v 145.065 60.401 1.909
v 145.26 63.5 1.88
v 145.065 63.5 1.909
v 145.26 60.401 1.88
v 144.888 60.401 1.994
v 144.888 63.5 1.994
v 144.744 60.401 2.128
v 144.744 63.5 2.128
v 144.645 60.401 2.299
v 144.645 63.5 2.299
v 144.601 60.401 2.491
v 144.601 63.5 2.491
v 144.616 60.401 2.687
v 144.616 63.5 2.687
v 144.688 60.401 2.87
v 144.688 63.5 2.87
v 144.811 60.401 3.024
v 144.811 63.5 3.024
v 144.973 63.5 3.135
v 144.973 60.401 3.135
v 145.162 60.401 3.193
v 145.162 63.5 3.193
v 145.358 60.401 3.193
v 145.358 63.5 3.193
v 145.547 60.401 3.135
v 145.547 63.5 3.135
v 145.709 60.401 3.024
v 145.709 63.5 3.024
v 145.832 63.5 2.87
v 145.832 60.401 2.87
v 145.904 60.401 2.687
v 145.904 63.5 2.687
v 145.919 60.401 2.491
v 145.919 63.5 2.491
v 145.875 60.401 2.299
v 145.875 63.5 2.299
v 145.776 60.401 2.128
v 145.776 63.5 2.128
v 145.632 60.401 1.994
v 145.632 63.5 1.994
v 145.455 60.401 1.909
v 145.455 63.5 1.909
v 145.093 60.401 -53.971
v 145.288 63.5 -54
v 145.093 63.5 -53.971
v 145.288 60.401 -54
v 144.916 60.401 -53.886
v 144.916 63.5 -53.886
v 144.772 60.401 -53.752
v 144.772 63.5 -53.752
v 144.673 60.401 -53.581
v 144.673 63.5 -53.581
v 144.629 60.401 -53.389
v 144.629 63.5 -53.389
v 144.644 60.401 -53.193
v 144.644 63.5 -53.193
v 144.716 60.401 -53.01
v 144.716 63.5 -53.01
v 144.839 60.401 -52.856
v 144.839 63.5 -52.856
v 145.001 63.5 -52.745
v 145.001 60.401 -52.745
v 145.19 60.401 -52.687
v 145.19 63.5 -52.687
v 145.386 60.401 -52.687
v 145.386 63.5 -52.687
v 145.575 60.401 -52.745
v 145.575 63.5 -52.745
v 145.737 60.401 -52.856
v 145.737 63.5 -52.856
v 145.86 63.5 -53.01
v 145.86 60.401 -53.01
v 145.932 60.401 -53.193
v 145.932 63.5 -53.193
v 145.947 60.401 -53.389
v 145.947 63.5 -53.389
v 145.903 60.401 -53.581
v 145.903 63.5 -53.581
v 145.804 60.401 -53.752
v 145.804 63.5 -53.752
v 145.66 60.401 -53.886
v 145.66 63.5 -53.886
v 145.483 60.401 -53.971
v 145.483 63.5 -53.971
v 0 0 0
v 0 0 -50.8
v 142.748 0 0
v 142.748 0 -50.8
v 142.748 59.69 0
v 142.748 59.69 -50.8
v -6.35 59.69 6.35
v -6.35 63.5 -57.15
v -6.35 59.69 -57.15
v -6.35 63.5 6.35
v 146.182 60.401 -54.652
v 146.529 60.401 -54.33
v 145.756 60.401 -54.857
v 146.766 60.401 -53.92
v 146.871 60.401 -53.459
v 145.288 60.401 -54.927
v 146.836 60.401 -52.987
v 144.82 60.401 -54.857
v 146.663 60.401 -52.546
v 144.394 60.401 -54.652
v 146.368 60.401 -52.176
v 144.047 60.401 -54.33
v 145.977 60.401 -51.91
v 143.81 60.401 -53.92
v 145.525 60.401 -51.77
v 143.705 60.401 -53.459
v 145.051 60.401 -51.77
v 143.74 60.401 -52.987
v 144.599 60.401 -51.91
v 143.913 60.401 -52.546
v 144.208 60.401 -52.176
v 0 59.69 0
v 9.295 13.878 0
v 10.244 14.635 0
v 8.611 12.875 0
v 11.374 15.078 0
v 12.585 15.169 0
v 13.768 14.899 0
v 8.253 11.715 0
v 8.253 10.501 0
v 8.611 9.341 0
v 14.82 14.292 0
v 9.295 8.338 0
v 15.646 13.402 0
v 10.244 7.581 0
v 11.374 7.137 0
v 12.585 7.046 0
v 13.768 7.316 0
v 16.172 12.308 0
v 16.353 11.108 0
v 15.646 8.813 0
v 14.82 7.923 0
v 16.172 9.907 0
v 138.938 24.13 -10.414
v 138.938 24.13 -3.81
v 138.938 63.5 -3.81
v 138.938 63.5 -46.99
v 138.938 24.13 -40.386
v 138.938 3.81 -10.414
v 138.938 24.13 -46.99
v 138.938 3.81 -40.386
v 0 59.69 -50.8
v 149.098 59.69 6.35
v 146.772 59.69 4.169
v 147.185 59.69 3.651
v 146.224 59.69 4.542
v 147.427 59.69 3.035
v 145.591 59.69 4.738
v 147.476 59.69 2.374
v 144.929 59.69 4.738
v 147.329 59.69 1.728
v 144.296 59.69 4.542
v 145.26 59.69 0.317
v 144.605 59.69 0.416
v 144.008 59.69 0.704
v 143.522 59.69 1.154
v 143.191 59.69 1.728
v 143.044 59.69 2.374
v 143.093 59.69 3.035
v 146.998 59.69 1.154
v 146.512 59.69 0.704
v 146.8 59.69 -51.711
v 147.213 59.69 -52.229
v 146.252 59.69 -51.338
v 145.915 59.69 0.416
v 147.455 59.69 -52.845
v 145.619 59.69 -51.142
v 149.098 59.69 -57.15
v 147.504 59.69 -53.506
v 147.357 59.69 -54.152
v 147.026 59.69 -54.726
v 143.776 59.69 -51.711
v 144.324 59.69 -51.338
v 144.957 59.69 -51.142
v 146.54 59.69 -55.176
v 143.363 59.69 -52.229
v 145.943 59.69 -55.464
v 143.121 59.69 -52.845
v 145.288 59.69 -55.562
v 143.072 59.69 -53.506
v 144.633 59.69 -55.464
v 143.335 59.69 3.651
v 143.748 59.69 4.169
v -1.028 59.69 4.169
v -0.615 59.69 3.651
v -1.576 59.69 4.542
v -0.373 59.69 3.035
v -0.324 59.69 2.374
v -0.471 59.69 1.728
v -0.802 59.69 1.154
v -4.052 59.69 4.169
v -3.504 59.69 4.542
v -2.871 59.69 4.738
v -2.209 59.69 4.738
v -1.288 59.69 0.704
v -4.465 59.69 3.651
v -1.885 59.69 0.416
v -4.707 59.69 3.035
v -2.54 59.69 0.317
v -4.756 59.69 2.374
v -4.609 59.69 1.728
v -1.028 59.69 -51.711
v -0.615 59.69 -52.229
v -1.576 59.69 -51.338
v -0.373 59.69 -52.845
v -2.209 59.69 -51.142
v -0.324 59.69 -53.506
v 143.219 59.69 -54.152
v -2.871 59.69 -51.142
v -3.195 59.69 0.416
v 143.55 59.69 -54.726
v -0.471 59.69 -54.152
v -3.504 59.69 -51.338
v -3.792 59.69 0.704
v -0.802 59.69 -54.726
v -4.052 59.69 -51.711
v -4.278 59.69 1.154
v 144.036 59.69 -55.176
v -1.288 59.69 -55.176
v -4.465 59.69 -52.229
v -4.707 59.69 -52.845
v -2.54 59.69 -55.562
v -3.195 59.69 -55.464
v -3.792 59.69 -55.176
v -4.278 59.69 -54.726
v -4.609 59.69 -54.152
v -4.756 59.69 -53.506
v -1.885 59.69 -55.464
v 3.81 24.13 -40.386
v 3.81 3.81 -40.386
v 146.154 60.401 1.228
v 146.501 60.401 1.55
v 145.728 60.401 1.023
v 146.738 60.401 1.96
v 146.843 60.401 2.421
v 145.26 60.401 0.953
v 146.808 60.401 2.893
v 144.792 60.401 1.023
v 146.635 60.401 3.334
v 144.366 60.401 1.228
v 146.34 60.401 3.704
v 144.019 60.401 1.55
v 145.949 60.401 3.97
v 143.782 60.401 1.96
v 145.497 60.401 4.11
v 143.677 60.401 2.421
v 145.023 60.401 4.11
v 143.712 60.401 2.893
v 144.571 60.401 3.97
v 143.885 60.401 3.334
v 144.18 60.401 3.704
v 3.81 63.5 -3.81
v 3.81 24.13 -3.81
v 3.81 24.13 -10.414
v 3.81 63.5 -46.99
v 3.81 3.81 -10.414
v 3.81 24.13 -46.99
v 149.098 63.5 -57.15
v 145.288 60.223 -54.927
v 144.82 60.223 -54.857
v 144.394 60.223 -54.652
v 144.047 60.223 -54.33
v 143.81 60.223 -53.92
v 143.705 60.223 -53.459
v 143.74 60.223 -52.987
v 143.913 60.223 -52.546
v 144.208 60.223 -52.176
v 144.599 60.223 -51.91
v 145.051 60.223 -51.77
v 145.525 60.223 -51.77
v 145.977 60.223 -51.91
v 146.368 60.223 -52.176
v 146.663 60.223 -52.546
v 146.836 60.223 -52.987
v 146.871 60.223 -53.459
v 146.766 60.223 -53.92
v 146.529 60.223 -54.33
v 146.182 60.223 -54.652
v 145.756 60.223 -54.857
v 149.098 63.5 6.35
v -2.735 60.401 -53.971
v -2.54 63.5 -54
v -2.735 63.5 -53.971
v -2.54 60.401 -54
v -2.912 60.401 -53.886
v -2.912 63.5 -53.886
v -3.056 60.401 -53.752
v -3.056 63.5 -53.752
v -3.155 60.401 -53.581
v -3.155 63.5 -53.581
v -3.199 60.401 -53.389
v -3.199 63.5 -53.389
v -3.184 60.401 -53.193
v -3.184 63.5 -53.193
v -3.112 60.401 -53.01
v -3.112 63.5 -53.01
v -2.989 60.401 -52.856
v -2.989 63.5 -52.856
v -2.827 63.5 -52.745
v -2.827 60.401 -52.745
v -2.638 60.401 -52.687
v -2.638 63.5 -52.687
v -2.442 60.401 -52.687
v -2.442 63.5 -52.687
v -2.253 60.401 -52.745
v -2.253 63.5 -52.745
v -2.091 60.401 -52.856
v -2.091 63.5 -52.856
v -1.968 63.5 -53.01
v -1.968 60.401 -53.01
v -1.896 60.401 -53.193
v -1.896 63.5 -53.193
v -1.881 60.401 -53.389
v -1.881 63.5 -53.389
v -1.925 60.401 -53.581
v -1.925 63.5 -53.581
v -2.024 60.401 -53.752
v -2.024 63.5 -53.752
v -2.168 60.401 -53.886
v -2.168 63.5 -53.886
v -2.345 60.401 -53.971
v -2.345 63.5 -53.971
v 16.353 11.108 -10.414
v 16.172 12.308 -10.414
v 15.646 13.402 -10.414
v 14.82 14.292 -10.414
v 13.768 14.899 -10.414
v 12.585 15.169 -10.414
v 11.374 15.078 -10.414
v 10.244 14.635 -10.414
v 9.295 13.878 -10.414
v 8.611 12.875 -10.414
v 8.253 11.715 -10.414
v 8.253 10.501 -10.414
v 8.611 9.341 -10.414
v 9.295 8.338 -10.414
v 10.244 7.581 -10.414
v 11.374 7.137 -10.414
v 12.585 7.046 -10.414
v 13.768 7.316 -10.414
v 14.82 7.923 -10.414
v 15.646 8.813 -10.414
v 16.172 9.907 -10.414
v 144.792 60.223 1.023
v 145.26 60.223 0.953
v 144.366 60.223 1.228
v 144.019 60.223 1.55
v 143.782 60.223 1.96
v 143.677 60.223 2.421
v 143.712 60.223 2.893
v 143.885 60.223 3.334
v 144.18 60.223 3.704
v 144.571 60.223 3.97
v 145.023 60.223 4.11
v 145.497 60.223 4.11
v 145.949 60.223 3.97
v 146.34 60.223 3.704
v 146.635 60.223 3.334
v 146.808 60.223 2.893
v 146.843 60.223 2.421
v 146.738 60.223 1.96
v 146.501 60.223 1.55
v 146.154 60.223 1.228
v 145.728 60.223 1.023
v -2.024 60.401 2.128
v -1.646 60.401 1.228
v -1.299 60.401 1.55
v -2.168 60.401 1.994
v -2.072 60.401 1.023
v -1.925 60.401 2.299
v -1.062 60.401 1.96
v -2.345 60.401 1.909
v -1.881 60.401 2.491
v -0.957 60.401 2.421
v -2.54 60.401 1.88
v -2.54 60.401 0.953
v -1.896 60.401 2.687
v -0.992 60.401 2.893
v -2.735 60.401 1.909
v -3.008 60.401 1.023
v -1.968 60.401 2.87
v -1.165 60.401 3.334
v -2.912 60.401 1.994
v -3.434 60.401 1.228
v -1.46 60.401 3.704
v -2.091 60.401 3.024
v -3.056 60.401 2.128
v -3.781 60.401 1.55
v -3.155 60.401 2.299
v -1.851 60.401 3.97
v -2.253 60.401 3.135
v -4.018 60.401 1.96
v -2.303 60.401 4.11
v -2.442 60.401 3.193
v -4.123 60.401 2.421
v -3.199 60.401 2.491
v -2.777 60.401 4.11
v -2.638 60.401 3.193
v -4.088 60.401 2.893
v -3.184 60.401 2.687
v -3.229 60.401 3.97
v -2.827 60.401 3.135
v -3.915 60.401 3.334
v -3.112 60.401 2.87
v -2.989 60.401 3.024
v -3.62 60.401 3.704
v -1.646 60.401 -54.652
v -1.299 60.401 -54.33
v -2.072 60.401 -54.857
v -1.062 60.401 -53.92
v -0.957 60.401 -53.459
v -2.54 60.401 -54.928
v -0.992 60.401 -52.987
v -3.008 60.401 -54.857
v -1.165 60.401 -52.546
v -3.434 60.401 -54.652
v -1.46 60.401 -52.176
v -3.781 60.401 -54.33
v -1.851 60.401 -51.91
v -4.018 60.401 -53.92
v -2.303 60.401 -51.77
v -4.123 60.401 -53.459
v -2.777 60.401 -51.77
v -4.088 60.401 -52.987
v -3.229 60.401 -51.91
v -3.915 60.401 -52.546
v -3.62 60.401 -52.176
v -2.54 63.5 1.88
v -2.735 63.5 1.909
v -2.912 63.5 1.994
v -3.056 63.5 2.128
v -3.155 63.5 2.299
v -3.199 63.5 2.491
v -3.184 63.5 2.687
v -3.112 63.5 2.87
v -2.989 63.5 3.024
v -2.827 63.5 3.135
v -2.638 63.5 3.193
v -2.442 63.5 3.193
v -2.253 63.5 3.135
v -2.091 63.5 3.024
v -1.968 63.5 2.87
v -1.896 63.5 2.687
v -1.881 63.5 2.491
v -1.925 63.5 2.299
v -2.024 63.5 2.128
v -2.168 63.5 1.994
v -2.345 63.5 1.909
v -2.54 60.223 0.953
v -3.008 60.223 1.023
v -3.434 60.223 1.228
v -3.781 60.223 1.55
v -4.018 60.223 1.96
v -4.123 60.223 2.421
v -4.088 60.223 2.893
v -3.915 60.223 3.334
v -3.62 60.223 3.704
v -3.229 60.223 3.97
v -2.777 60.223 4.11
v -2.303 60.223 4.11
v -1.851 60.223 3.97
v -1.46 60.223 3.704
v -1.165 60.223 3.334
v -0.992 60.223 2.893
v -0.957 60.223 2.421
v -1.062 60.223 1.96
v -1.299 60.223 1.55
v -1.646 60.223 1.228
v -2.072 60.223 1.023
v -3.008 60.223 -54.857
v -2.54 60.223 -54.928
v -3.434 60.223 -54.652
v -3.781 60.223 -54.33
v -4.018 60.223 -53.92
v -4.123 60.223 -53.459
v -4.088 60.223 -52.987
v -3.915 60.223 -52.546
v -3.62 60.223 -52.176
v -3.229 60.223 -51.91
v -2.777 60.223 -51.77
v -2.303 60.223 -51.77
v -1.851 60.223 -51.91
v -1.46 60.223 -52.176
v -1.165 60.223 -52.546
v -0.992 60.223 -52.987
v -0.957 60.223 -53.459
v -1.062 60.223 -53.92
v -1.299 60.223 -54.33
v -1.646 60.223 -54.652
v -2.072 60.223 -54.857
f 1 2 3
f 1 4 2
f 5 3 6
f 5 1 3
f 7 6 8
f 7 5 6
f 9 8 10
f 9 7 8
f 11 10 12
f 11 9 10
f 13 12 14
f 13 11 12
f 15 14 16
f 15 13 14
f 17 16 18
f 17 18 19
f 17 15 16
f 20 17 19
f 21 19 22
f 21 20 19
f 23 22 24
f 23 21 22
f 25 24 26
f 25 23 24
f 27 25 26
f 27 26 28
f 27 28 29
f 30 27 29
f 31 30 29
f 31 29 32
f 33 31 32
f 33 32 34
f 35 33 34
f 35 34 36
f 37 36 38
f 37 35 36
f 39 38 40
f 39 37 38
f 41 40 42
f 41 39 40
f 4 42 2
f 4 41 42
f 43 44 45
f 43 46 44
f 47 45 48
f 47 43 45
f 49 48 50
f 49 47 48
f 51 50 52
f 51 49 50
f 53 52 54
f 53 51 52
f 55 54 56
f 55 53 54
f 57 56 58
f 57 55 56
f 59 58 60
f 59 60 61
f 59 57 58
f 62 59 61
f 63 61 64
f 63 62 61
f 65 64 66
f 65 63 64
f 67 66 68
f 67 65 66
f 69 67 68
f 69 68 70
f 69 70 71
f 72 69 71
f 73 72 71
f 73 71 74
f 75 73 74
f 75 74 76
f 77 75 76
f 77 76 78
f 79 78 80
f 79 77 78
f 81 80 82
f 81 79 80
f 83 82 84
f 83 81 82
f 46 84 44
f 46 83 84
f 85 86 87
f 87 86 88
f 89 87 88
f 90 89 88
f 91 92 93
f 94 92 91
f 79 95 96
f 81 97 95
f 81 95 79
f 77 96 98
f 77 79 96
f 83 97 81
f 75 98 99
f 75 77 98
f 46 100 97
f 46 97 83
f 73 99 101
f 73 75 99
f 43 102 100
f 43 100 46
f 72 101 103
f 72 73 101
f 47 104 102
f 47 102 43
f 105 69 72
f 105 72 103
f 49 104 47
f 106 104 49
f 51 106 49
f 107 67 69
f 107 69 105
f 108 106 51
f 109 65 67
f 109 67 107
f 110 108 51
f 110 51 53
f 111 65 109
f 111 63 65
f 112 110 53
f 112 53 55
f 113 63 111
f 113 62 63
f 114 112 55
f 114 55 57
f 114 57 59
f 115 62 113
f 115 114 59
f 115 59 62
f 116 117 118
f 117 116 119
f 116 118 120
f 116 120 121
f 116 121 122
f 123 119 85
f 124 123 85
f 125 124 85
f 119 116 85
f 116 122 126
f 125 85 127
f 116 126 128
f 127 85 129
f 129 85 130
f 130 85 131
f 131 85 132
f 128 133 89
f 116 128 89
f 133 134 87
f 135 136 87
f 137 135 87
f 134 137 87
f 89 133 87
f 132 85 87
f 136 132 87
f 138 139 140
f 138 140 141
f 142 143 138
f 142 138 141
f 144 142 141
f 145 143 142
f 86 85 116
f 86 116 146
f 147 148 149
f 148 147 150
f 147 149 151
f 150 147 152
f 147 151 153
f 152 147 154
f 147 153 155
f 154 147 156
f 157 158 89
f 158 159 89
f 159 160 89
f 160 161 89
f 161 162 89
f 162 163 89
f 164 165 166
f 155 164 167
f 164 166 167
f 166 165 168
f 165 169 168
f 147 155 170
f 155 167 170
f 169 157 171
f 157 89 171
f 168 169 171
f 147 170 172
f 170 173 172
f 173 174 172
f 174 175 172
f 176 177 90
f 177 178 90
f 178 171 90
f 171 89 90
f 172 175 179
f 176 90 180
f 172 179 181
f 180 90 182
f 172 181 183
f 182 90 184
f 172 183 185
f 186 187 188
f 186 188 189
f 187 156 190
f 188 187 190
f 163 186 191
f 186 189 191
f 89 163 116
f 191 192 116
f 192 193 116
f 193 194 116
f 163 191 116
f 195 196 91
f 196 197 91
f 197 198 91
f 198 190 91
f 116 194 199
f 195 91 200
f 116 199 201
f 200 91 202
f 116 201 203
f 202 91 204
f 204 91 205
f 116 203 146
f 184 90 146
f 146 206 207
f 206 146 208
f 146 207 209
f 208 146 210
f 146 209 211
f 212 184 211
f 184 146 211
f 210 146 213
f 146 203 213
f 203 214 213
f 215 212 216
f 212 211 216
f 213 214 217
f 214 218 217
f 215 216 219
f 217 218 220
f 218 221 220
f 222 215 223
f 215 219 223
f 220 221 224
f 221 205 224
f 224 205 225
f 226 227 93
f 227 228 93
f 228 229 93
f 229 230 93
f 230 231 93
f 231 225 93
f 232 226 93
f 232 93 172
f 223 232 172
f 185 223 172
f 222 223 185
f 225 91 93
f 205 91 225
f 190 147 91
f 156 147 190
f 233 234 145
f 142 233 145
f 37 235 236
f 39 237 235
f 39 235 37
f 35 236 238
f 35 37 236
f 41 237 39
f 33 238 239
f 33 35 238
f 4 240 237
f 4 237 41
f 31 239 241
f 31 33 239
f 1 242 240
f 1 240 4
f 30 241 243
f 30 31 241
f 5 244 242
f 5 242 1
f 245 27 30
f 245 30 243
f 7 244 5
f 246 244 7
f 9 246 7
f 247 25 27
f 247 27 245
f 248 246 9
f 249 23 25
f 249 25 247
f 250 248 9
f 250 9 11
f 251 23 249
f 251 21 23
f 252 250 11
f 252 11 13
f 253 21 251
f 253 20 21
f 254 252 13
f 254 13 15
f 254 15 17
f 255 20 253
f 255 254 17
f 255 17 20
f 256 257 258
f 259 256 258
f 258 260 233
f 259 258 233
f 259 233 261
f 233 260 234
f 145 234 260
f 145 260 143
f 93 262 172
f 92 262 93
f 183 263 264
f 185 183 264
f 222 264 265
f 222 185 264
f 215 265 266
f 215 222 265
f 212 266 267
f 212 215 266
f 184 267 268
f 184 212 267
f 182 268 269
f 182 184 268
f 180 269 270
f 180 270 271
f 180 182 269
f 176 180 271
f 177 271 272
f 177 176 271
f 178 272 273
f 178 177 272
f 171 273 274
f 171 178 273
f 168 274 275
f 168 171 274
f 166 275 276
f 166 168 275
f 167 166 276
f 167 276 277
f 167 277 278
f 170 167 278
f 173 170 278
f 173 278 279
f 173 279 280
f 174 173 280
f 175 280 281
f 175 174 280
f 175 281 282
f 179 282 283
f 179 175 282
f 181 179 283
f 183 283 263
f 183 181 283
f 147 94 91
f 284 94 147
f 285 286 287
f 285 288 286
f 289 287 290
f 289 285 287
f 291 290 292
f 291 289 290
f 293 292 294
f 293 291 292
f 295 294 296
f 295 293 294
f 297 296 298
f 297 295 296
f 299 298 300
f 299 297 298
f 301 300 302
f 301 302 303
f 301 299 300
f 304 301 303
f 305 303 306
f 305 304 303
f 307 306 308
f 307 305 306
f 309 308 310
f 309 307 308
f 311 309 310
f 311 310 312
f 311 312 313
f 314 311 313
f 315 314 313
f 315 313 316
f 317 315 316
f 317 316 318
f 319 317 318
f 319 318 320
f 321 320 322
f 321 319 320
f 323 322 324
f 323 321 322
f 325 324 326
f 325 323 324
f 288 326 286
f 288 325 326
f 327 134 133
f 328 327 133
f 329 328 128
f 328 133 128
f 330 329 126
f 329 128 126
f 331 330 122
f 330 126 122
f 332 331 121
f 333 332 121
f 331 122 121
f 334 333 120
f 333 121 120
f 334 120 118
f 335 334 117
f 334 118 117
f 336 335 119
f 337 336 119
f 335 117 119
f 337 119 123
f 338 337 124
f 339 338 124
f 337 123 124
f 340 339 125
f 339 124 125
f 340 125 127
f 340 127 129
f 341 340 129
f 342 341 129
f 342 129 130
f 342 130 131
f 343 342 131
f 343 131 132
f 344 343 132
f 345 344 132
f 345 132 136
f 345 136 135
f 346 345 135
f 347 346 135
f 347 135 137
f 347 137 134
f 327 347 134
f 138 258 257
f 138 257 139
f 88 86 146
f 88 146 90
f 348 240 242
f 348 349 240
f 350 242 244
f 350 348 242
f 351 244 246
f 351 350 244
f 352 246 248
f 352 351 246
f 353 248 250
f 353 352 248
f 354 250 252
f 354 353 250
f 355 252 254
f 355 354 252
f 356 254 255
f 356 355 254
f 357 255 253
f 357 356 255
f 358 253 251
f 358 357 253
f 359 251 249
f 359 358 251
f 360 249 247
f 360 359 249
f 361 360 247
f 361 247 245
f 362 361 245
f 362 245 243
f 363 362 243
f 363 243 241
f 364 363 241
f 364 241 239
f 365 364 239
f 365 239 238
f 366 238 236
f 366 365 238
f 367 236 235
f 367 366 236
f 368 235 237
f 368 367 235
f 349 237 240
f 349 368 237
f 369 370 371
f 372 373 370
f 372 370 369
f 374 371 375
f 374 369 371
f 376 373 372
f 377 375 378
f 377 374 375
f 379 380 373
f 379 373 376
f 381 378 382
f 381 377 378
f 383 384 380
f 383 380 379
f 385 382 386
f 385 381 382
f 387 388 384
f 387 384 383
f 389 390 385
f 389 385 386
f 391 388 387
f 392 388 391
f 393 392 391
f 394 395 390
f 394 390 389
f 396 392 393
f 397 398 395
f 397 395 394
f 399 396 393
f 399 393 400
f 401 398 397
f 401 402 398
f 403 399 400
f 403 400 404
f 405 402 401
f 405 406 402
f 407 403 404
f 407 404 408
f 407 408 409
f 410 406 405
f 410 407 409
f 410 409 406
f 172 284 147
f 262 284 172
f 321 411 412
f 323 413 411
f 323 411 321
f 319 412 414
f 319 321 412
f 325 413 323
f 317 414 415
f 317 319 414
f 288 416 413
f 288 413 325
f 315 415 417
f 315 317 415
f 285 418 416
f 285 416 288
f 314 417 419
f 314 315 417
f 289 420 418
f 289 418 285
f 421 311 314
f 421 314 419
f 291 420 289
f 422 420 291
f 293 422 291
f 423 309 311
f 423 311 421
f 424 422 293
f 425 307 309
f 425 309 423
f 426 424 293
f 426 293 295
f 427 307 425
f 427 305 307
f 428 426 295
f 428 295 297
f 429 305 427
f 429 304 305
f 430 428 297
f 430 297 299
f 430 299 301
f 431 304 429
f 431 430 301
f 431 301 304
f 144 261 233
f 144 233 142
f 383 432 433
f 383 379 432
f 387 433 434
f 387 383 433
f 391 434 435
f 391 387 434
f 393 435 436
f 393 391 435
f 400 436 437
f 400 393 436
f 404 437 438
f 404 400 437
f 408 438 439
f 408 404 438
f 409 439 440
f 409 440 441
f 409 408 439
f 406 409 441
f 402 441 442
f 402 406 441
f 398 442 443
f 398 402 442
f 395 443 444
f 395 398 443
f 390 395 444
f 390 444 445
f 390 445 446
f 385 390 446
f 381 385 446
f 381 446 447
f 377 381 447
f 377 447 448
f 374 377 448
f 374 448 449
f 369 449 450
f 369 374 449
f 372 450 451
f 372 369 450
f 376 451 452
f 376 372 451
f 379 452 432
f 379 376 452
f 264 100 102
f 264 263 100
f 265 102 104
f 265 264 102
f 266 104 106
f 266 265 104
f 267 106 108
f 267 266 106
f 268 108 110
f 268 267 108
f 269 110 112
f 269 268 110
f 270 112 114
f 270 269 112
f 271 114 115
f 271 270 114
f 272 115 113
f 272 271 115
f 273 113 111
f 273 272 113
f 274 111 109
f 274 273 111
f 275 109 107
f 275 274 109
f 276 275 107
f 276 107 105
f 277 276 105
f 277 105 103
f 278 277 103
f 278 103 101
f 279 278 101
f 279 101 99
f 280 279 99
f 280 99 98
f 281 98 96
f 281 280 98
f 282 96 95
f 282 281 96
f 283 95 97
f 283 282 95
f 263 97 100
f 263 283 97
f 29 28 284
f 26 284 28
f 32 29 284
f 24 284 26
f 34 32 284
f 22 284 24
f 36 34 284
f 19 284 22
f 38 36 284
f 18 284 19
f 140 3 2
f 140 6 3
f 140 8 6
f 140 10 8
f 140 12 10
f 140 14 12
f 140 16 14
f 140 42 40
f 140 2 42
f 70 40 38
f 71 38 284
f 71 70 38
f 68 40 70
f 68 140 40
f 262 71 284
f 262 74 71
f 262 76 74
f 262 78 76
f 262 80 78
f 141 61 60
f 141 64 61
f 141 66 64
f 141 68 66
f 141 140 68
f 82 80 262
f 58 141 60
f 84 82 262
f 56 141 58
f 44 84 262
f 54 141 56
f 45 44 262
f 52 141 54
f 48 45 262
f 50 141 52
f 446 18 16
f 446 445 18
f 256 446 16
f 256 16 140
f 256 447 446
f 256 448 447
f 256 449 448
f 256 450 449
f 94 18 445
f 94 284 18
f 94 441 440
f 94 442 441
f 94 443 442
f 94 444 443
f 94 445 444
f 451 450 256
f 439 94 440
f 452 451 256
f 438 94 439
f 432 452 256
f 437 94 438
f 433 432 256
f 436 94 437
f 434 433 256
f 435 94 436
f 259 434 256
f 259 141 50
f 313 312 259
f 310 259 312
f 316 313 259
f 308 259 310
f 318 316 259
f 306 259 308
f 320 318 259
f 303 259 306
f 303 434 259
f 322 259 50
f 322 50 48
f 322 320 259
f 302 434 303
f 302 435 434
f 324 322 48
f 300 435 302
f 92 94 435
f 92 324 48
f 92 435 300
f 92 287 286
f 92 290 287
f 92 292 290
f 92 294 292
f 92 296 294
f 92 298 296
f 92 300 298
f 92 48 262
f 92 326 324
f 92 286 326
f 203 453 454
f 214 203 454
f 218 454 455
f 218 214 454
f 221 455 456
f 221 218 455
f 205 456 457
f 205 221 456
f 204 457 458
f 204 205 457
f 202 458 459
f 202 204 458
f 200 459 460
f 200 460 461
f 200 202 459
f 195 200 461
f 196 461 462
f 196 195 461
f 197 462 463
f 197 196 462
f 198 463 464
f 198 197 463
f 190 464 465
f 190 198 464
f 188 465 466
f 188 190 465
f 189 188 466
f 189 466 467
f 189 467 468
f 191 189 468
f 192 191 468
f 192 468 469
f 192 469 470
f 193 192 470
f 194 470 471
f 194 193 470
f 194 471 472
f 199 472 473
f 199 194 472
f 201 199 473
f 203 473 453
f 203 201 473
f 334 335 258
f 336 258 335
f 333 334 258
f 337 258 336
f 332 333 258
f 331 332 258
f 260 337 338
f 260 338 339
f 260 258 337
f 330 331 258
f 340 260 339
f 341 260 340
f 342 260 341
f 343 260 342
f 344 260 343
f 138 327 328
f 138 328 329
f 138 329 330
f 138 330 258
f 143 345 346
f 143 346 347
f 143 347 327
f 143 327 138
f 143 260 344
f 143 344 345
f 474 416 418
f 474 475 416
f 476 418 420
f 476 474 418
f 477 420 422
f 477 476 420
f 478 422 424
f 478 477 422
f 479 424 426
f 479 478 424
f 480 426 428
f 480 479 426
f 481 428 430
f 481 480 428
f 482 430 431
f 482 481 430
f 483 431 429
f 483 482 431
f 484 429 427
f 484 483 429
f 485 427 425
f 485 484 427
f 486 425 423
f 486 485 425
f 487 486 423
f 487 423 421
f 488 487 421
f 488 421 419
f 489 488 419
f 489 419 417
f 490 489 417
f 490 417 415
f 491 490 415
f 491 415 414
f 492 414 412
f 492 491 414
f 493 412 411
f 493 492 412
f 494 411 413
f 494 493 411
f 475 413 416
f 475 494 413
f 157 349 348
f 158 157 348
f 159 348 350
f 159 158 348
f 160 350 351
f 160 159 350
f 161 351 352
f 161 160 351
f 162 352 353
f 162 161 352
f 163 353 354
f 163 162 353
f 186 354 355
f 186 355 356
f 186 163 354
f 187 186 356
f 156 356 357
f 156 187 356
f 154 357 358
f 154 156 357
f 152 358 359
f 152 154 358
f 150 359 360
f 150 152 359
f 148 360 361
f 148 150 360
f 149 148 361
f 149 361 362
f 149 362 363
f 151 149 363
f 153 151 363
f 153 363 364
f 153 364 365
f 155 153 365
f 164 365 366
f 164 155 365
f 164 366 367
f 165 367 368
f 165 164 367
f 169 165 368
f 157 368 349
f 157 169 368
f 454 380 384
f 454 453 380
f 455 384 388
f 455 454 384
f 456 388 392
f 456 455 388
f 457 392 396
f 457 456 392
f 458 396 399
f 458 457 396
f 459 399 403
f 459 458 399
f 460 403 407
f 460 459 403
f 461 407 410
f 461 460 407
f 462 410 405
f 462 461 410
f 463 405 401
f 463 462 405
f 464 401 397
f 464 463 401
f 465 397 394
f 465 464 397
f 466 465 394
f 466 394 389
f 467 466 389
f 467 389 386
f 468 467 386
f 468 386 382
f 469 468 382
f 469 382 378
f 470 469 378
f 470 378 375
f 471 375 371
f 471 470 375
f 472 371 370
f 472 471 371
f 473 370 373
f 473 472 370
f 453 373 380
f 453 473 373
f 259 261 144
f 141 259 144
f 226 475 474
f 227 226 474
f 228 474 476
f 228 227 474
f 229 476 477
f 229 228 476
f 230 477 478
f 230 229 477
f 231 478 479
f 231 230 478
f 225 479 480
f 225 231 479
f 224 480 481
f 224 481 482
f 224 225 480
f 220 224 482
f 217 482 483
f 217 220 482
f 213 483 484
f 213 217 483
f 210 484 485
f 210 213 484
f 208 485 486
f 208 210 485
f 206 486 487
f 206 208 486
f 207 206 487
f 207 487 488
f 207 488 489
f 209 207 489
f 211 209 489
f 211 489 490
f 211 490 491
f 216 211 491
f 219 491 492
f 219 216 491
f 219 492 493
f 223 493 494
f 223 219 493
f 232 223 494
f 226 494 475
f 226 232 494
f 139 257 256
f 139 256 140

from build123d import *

# Parameters (mm, degrees)
SKETCH1_W                                   = 142.748
SKETCH1_H                                   = 50.8
BOSS_EXTRUDE1_DEPTH                         = 63.5
SHELL1_T                                    = -3.81
SKETCH2_W                                   = 155.448
SKETCH2_H                                   = 3.81
BOSS_EXTRUDE2_DEPTH                         = 6.35
SKETCH3_W                                   = 155.448
SKETCH3_H                                   = 3.81
BOSS_EXTRUDE3_DEPTH                         = 6.35
SKETCH4_W                                   = 50.8
SKETCH4_H                                   = 3.81
BOSS_EXTRUDE4_DEPTH                         = 6.35
SKETCH5_W                                   = 50.8
SKETCH5_H                                   = 3.81
BOSS_EXTRUDE5_DEPTH                         = 6.35
CBORE_FOR_00_BINDING_HEAD_MACHINE_S_2_COUNT = 2
CBORE_FOR_00_BINDING_HEAD_MACHINE_S_2_PITCH = 147.800013628
CBORE_FOR_00_BINDING_HEAD_MACHINE_S_3_COUNT = 2
CBORE_FOR_00_BINDING_HEAD_MACHINE_S_3_PITCH = 158.036995618
CBORE_FOR_00_BINDING_HEAD_MACHINE_S_4_COUNT = 2
CBORE_FOR_00_BINDING_HEAD_MACHINE_S_4_PITCH = 55.88
SKETCH13_W                                  = 135.128
SKETCH13_H                                  = 6.604
BOSS_EXTRUDE6_DEPTH                         = 20.32
SKETCH14_R                                  = 4.072823047
CUT_EXTRUDE1_DEPTH                          = 13.97


with BuildPart() as part:
    # Sketch1 → Boss-Extrude1 (new body)
    with BuildSketch(Plane(origin=(0, 0, 0), x_dir=(1, 0, 0), z_dir=(0, 1, 0))):
        with Locations((71.374, 25.4)):
            Rectangle(SKETCH1_W, SKETCH1_H)
    extrude(amount=BOSS_EXTRUDE1_DEPTH)

    # Shell1
    shell1_openings = [part.faces().sort_by_distance(p)[0] for p in [
        (71.374, 63.5, -25.4),
    ]]
    offset(amount=SHELL1_T, openings=shell1_openings, kind=Kind.INTERSECTION)

    # Sketch2 → Boss-Extrude2 (add)
    with BuildSketch(Plane.XY):
        with Locations((71.374, 61.595)):
            Rectangle(SKETCH2_W, SKETCH2_H)
    extrude(amount=BOSS_EXTRUDE2_DEPTH)

    # Sketch3 → Boss-Extrude3 (add)
    with BuildSketch(Plane(origin=(0, 0, -50.8), x_dir=(-1, 0, 0), z_dir=(0, 0, -1))):
        with Locations((-71.374, 61.595)):
            Rectangle(SKETCH3_W, SKETCH3_H)
    extrude(amount=BOSS_EXTRUDE3_DEPTH)

    # Sketch4 → Boss-Extrude4 (add)
    with BuildSketch(Plane.ZY):
        with Locations((-25.4, 61.595)):
            Rectangle(SKETCH4_W, SKETCH4_H)
    extrude(amount=BOSS_EXTRUDE4_DEPTH)

    # Sketch5 → Boss-Extrude5 (add)
    with BuildSketch(Plane(origin=(142.748, 0, 0), x_dir=(0, 0, -1), z_dir=(1, 0, 0))):
        with Locations((25.4, 61.595)):
            Rectangle(SKETCH5_W, SKETCH5_H)
    extrude(amount=BOSS_EXTRUDE5_DEPTH)

    # Sketch11 → CBORE for #00 Binding Head Machine Screw3 (revolve, cut)
    with BuildSketch(Plane(origin=(-2.54, 59.69, 2.54), x_dir=(0, 0, -1), z_dir=(1, 0, 0))):
        Polygon((0, 0), (0, 3.81), (0.6604, 3.81), (0.6604, 0.7112), (1.5875, 0.7112), (1.5875, 0.532828266), (2.2225, 0), align=None)
    cbore_for_00_binding_head_machine_screw = revolve(axis=Axis((-2.54, 53.34, 2.54), (0, 1, 0)), mode=Mode.SUBTRACT)

    # CBORE for _00 Binding Head Machine S 2: CBORE for #00 Binding Head Machine Screw3 ×2
    with Locations(*[(i * CBORE_FOR_00_BINDING_HEAD_MACHINE_S_2_PITCH, 0, 0) for i in range(1, CBORE_FOR_00_BINDING_HEAD_MACHINE_S_2_COUNT)]):
        add(cbore_for_00_binding_head_machine_screw, mode=Mode.SUBTRACT)

    # CBORE for _00 Binding Head Machine S 3: CBORE for #00 Binding Head Machine Screw3 ×2
    with Locations(*[Vector(0.9354012294514634, 0, -0.35358809360708243) * (i * CBORE_FOR_00_BINDING_HEAD_MACHINE_S_3_PITCH) for i in range(1, CBORE_FOR_00_BINDING_HEAD_MACHINE_S_3_COUNT)]):
        add(cbore_for_00_binding_head_machine_screw, mode=Mode.SUBTRACT)

    # CBORE for _00 Binding Head Machine S 4: CBORE for #00 Binding Head Machine Screw3 ×2
    with Locations(*[(0, 0, -i * CBORE_FOR_00_BINDING_HEAD_MACHINE_S_4_PITCH) for i in range(1, CBORE_FOR_00_BINDING_HEAD_MACHINE_S_4_COUNT)]):
        add(cbore_for_00_binding_head_machine_screw, mode=Mode.SUBTRACT)

    # Sketch13 → Boss-Extrude6 (add)
    with BuildSketch(Plane(origin=(0, 3.81, 0), x_dir=(1, 0, 0), z_dir=(0, 1, 0))):
        with Locations((71.374, 43.688)):
            Rectangle(SKETCH13_W, SKETCH13_H)
        with Locations((71.374, 7.112)):
            Rectangle(SKETCH13_W, SKETCH13_H)
    extrude(amount=BOSS_EXTRUDE6_DEPTH)

    # Sketch14 → Cut-Extrude1 (cut)
    with BuildSketch(Plane.XY):
        with Locations((12.280475356, 11.107728565)):
            Circle(SKETCH14_R)
    extrude(amount=-CUT_EXTRUDE1_DEPTH, mode=Mode.SUBTRACT)


solid = part.part
